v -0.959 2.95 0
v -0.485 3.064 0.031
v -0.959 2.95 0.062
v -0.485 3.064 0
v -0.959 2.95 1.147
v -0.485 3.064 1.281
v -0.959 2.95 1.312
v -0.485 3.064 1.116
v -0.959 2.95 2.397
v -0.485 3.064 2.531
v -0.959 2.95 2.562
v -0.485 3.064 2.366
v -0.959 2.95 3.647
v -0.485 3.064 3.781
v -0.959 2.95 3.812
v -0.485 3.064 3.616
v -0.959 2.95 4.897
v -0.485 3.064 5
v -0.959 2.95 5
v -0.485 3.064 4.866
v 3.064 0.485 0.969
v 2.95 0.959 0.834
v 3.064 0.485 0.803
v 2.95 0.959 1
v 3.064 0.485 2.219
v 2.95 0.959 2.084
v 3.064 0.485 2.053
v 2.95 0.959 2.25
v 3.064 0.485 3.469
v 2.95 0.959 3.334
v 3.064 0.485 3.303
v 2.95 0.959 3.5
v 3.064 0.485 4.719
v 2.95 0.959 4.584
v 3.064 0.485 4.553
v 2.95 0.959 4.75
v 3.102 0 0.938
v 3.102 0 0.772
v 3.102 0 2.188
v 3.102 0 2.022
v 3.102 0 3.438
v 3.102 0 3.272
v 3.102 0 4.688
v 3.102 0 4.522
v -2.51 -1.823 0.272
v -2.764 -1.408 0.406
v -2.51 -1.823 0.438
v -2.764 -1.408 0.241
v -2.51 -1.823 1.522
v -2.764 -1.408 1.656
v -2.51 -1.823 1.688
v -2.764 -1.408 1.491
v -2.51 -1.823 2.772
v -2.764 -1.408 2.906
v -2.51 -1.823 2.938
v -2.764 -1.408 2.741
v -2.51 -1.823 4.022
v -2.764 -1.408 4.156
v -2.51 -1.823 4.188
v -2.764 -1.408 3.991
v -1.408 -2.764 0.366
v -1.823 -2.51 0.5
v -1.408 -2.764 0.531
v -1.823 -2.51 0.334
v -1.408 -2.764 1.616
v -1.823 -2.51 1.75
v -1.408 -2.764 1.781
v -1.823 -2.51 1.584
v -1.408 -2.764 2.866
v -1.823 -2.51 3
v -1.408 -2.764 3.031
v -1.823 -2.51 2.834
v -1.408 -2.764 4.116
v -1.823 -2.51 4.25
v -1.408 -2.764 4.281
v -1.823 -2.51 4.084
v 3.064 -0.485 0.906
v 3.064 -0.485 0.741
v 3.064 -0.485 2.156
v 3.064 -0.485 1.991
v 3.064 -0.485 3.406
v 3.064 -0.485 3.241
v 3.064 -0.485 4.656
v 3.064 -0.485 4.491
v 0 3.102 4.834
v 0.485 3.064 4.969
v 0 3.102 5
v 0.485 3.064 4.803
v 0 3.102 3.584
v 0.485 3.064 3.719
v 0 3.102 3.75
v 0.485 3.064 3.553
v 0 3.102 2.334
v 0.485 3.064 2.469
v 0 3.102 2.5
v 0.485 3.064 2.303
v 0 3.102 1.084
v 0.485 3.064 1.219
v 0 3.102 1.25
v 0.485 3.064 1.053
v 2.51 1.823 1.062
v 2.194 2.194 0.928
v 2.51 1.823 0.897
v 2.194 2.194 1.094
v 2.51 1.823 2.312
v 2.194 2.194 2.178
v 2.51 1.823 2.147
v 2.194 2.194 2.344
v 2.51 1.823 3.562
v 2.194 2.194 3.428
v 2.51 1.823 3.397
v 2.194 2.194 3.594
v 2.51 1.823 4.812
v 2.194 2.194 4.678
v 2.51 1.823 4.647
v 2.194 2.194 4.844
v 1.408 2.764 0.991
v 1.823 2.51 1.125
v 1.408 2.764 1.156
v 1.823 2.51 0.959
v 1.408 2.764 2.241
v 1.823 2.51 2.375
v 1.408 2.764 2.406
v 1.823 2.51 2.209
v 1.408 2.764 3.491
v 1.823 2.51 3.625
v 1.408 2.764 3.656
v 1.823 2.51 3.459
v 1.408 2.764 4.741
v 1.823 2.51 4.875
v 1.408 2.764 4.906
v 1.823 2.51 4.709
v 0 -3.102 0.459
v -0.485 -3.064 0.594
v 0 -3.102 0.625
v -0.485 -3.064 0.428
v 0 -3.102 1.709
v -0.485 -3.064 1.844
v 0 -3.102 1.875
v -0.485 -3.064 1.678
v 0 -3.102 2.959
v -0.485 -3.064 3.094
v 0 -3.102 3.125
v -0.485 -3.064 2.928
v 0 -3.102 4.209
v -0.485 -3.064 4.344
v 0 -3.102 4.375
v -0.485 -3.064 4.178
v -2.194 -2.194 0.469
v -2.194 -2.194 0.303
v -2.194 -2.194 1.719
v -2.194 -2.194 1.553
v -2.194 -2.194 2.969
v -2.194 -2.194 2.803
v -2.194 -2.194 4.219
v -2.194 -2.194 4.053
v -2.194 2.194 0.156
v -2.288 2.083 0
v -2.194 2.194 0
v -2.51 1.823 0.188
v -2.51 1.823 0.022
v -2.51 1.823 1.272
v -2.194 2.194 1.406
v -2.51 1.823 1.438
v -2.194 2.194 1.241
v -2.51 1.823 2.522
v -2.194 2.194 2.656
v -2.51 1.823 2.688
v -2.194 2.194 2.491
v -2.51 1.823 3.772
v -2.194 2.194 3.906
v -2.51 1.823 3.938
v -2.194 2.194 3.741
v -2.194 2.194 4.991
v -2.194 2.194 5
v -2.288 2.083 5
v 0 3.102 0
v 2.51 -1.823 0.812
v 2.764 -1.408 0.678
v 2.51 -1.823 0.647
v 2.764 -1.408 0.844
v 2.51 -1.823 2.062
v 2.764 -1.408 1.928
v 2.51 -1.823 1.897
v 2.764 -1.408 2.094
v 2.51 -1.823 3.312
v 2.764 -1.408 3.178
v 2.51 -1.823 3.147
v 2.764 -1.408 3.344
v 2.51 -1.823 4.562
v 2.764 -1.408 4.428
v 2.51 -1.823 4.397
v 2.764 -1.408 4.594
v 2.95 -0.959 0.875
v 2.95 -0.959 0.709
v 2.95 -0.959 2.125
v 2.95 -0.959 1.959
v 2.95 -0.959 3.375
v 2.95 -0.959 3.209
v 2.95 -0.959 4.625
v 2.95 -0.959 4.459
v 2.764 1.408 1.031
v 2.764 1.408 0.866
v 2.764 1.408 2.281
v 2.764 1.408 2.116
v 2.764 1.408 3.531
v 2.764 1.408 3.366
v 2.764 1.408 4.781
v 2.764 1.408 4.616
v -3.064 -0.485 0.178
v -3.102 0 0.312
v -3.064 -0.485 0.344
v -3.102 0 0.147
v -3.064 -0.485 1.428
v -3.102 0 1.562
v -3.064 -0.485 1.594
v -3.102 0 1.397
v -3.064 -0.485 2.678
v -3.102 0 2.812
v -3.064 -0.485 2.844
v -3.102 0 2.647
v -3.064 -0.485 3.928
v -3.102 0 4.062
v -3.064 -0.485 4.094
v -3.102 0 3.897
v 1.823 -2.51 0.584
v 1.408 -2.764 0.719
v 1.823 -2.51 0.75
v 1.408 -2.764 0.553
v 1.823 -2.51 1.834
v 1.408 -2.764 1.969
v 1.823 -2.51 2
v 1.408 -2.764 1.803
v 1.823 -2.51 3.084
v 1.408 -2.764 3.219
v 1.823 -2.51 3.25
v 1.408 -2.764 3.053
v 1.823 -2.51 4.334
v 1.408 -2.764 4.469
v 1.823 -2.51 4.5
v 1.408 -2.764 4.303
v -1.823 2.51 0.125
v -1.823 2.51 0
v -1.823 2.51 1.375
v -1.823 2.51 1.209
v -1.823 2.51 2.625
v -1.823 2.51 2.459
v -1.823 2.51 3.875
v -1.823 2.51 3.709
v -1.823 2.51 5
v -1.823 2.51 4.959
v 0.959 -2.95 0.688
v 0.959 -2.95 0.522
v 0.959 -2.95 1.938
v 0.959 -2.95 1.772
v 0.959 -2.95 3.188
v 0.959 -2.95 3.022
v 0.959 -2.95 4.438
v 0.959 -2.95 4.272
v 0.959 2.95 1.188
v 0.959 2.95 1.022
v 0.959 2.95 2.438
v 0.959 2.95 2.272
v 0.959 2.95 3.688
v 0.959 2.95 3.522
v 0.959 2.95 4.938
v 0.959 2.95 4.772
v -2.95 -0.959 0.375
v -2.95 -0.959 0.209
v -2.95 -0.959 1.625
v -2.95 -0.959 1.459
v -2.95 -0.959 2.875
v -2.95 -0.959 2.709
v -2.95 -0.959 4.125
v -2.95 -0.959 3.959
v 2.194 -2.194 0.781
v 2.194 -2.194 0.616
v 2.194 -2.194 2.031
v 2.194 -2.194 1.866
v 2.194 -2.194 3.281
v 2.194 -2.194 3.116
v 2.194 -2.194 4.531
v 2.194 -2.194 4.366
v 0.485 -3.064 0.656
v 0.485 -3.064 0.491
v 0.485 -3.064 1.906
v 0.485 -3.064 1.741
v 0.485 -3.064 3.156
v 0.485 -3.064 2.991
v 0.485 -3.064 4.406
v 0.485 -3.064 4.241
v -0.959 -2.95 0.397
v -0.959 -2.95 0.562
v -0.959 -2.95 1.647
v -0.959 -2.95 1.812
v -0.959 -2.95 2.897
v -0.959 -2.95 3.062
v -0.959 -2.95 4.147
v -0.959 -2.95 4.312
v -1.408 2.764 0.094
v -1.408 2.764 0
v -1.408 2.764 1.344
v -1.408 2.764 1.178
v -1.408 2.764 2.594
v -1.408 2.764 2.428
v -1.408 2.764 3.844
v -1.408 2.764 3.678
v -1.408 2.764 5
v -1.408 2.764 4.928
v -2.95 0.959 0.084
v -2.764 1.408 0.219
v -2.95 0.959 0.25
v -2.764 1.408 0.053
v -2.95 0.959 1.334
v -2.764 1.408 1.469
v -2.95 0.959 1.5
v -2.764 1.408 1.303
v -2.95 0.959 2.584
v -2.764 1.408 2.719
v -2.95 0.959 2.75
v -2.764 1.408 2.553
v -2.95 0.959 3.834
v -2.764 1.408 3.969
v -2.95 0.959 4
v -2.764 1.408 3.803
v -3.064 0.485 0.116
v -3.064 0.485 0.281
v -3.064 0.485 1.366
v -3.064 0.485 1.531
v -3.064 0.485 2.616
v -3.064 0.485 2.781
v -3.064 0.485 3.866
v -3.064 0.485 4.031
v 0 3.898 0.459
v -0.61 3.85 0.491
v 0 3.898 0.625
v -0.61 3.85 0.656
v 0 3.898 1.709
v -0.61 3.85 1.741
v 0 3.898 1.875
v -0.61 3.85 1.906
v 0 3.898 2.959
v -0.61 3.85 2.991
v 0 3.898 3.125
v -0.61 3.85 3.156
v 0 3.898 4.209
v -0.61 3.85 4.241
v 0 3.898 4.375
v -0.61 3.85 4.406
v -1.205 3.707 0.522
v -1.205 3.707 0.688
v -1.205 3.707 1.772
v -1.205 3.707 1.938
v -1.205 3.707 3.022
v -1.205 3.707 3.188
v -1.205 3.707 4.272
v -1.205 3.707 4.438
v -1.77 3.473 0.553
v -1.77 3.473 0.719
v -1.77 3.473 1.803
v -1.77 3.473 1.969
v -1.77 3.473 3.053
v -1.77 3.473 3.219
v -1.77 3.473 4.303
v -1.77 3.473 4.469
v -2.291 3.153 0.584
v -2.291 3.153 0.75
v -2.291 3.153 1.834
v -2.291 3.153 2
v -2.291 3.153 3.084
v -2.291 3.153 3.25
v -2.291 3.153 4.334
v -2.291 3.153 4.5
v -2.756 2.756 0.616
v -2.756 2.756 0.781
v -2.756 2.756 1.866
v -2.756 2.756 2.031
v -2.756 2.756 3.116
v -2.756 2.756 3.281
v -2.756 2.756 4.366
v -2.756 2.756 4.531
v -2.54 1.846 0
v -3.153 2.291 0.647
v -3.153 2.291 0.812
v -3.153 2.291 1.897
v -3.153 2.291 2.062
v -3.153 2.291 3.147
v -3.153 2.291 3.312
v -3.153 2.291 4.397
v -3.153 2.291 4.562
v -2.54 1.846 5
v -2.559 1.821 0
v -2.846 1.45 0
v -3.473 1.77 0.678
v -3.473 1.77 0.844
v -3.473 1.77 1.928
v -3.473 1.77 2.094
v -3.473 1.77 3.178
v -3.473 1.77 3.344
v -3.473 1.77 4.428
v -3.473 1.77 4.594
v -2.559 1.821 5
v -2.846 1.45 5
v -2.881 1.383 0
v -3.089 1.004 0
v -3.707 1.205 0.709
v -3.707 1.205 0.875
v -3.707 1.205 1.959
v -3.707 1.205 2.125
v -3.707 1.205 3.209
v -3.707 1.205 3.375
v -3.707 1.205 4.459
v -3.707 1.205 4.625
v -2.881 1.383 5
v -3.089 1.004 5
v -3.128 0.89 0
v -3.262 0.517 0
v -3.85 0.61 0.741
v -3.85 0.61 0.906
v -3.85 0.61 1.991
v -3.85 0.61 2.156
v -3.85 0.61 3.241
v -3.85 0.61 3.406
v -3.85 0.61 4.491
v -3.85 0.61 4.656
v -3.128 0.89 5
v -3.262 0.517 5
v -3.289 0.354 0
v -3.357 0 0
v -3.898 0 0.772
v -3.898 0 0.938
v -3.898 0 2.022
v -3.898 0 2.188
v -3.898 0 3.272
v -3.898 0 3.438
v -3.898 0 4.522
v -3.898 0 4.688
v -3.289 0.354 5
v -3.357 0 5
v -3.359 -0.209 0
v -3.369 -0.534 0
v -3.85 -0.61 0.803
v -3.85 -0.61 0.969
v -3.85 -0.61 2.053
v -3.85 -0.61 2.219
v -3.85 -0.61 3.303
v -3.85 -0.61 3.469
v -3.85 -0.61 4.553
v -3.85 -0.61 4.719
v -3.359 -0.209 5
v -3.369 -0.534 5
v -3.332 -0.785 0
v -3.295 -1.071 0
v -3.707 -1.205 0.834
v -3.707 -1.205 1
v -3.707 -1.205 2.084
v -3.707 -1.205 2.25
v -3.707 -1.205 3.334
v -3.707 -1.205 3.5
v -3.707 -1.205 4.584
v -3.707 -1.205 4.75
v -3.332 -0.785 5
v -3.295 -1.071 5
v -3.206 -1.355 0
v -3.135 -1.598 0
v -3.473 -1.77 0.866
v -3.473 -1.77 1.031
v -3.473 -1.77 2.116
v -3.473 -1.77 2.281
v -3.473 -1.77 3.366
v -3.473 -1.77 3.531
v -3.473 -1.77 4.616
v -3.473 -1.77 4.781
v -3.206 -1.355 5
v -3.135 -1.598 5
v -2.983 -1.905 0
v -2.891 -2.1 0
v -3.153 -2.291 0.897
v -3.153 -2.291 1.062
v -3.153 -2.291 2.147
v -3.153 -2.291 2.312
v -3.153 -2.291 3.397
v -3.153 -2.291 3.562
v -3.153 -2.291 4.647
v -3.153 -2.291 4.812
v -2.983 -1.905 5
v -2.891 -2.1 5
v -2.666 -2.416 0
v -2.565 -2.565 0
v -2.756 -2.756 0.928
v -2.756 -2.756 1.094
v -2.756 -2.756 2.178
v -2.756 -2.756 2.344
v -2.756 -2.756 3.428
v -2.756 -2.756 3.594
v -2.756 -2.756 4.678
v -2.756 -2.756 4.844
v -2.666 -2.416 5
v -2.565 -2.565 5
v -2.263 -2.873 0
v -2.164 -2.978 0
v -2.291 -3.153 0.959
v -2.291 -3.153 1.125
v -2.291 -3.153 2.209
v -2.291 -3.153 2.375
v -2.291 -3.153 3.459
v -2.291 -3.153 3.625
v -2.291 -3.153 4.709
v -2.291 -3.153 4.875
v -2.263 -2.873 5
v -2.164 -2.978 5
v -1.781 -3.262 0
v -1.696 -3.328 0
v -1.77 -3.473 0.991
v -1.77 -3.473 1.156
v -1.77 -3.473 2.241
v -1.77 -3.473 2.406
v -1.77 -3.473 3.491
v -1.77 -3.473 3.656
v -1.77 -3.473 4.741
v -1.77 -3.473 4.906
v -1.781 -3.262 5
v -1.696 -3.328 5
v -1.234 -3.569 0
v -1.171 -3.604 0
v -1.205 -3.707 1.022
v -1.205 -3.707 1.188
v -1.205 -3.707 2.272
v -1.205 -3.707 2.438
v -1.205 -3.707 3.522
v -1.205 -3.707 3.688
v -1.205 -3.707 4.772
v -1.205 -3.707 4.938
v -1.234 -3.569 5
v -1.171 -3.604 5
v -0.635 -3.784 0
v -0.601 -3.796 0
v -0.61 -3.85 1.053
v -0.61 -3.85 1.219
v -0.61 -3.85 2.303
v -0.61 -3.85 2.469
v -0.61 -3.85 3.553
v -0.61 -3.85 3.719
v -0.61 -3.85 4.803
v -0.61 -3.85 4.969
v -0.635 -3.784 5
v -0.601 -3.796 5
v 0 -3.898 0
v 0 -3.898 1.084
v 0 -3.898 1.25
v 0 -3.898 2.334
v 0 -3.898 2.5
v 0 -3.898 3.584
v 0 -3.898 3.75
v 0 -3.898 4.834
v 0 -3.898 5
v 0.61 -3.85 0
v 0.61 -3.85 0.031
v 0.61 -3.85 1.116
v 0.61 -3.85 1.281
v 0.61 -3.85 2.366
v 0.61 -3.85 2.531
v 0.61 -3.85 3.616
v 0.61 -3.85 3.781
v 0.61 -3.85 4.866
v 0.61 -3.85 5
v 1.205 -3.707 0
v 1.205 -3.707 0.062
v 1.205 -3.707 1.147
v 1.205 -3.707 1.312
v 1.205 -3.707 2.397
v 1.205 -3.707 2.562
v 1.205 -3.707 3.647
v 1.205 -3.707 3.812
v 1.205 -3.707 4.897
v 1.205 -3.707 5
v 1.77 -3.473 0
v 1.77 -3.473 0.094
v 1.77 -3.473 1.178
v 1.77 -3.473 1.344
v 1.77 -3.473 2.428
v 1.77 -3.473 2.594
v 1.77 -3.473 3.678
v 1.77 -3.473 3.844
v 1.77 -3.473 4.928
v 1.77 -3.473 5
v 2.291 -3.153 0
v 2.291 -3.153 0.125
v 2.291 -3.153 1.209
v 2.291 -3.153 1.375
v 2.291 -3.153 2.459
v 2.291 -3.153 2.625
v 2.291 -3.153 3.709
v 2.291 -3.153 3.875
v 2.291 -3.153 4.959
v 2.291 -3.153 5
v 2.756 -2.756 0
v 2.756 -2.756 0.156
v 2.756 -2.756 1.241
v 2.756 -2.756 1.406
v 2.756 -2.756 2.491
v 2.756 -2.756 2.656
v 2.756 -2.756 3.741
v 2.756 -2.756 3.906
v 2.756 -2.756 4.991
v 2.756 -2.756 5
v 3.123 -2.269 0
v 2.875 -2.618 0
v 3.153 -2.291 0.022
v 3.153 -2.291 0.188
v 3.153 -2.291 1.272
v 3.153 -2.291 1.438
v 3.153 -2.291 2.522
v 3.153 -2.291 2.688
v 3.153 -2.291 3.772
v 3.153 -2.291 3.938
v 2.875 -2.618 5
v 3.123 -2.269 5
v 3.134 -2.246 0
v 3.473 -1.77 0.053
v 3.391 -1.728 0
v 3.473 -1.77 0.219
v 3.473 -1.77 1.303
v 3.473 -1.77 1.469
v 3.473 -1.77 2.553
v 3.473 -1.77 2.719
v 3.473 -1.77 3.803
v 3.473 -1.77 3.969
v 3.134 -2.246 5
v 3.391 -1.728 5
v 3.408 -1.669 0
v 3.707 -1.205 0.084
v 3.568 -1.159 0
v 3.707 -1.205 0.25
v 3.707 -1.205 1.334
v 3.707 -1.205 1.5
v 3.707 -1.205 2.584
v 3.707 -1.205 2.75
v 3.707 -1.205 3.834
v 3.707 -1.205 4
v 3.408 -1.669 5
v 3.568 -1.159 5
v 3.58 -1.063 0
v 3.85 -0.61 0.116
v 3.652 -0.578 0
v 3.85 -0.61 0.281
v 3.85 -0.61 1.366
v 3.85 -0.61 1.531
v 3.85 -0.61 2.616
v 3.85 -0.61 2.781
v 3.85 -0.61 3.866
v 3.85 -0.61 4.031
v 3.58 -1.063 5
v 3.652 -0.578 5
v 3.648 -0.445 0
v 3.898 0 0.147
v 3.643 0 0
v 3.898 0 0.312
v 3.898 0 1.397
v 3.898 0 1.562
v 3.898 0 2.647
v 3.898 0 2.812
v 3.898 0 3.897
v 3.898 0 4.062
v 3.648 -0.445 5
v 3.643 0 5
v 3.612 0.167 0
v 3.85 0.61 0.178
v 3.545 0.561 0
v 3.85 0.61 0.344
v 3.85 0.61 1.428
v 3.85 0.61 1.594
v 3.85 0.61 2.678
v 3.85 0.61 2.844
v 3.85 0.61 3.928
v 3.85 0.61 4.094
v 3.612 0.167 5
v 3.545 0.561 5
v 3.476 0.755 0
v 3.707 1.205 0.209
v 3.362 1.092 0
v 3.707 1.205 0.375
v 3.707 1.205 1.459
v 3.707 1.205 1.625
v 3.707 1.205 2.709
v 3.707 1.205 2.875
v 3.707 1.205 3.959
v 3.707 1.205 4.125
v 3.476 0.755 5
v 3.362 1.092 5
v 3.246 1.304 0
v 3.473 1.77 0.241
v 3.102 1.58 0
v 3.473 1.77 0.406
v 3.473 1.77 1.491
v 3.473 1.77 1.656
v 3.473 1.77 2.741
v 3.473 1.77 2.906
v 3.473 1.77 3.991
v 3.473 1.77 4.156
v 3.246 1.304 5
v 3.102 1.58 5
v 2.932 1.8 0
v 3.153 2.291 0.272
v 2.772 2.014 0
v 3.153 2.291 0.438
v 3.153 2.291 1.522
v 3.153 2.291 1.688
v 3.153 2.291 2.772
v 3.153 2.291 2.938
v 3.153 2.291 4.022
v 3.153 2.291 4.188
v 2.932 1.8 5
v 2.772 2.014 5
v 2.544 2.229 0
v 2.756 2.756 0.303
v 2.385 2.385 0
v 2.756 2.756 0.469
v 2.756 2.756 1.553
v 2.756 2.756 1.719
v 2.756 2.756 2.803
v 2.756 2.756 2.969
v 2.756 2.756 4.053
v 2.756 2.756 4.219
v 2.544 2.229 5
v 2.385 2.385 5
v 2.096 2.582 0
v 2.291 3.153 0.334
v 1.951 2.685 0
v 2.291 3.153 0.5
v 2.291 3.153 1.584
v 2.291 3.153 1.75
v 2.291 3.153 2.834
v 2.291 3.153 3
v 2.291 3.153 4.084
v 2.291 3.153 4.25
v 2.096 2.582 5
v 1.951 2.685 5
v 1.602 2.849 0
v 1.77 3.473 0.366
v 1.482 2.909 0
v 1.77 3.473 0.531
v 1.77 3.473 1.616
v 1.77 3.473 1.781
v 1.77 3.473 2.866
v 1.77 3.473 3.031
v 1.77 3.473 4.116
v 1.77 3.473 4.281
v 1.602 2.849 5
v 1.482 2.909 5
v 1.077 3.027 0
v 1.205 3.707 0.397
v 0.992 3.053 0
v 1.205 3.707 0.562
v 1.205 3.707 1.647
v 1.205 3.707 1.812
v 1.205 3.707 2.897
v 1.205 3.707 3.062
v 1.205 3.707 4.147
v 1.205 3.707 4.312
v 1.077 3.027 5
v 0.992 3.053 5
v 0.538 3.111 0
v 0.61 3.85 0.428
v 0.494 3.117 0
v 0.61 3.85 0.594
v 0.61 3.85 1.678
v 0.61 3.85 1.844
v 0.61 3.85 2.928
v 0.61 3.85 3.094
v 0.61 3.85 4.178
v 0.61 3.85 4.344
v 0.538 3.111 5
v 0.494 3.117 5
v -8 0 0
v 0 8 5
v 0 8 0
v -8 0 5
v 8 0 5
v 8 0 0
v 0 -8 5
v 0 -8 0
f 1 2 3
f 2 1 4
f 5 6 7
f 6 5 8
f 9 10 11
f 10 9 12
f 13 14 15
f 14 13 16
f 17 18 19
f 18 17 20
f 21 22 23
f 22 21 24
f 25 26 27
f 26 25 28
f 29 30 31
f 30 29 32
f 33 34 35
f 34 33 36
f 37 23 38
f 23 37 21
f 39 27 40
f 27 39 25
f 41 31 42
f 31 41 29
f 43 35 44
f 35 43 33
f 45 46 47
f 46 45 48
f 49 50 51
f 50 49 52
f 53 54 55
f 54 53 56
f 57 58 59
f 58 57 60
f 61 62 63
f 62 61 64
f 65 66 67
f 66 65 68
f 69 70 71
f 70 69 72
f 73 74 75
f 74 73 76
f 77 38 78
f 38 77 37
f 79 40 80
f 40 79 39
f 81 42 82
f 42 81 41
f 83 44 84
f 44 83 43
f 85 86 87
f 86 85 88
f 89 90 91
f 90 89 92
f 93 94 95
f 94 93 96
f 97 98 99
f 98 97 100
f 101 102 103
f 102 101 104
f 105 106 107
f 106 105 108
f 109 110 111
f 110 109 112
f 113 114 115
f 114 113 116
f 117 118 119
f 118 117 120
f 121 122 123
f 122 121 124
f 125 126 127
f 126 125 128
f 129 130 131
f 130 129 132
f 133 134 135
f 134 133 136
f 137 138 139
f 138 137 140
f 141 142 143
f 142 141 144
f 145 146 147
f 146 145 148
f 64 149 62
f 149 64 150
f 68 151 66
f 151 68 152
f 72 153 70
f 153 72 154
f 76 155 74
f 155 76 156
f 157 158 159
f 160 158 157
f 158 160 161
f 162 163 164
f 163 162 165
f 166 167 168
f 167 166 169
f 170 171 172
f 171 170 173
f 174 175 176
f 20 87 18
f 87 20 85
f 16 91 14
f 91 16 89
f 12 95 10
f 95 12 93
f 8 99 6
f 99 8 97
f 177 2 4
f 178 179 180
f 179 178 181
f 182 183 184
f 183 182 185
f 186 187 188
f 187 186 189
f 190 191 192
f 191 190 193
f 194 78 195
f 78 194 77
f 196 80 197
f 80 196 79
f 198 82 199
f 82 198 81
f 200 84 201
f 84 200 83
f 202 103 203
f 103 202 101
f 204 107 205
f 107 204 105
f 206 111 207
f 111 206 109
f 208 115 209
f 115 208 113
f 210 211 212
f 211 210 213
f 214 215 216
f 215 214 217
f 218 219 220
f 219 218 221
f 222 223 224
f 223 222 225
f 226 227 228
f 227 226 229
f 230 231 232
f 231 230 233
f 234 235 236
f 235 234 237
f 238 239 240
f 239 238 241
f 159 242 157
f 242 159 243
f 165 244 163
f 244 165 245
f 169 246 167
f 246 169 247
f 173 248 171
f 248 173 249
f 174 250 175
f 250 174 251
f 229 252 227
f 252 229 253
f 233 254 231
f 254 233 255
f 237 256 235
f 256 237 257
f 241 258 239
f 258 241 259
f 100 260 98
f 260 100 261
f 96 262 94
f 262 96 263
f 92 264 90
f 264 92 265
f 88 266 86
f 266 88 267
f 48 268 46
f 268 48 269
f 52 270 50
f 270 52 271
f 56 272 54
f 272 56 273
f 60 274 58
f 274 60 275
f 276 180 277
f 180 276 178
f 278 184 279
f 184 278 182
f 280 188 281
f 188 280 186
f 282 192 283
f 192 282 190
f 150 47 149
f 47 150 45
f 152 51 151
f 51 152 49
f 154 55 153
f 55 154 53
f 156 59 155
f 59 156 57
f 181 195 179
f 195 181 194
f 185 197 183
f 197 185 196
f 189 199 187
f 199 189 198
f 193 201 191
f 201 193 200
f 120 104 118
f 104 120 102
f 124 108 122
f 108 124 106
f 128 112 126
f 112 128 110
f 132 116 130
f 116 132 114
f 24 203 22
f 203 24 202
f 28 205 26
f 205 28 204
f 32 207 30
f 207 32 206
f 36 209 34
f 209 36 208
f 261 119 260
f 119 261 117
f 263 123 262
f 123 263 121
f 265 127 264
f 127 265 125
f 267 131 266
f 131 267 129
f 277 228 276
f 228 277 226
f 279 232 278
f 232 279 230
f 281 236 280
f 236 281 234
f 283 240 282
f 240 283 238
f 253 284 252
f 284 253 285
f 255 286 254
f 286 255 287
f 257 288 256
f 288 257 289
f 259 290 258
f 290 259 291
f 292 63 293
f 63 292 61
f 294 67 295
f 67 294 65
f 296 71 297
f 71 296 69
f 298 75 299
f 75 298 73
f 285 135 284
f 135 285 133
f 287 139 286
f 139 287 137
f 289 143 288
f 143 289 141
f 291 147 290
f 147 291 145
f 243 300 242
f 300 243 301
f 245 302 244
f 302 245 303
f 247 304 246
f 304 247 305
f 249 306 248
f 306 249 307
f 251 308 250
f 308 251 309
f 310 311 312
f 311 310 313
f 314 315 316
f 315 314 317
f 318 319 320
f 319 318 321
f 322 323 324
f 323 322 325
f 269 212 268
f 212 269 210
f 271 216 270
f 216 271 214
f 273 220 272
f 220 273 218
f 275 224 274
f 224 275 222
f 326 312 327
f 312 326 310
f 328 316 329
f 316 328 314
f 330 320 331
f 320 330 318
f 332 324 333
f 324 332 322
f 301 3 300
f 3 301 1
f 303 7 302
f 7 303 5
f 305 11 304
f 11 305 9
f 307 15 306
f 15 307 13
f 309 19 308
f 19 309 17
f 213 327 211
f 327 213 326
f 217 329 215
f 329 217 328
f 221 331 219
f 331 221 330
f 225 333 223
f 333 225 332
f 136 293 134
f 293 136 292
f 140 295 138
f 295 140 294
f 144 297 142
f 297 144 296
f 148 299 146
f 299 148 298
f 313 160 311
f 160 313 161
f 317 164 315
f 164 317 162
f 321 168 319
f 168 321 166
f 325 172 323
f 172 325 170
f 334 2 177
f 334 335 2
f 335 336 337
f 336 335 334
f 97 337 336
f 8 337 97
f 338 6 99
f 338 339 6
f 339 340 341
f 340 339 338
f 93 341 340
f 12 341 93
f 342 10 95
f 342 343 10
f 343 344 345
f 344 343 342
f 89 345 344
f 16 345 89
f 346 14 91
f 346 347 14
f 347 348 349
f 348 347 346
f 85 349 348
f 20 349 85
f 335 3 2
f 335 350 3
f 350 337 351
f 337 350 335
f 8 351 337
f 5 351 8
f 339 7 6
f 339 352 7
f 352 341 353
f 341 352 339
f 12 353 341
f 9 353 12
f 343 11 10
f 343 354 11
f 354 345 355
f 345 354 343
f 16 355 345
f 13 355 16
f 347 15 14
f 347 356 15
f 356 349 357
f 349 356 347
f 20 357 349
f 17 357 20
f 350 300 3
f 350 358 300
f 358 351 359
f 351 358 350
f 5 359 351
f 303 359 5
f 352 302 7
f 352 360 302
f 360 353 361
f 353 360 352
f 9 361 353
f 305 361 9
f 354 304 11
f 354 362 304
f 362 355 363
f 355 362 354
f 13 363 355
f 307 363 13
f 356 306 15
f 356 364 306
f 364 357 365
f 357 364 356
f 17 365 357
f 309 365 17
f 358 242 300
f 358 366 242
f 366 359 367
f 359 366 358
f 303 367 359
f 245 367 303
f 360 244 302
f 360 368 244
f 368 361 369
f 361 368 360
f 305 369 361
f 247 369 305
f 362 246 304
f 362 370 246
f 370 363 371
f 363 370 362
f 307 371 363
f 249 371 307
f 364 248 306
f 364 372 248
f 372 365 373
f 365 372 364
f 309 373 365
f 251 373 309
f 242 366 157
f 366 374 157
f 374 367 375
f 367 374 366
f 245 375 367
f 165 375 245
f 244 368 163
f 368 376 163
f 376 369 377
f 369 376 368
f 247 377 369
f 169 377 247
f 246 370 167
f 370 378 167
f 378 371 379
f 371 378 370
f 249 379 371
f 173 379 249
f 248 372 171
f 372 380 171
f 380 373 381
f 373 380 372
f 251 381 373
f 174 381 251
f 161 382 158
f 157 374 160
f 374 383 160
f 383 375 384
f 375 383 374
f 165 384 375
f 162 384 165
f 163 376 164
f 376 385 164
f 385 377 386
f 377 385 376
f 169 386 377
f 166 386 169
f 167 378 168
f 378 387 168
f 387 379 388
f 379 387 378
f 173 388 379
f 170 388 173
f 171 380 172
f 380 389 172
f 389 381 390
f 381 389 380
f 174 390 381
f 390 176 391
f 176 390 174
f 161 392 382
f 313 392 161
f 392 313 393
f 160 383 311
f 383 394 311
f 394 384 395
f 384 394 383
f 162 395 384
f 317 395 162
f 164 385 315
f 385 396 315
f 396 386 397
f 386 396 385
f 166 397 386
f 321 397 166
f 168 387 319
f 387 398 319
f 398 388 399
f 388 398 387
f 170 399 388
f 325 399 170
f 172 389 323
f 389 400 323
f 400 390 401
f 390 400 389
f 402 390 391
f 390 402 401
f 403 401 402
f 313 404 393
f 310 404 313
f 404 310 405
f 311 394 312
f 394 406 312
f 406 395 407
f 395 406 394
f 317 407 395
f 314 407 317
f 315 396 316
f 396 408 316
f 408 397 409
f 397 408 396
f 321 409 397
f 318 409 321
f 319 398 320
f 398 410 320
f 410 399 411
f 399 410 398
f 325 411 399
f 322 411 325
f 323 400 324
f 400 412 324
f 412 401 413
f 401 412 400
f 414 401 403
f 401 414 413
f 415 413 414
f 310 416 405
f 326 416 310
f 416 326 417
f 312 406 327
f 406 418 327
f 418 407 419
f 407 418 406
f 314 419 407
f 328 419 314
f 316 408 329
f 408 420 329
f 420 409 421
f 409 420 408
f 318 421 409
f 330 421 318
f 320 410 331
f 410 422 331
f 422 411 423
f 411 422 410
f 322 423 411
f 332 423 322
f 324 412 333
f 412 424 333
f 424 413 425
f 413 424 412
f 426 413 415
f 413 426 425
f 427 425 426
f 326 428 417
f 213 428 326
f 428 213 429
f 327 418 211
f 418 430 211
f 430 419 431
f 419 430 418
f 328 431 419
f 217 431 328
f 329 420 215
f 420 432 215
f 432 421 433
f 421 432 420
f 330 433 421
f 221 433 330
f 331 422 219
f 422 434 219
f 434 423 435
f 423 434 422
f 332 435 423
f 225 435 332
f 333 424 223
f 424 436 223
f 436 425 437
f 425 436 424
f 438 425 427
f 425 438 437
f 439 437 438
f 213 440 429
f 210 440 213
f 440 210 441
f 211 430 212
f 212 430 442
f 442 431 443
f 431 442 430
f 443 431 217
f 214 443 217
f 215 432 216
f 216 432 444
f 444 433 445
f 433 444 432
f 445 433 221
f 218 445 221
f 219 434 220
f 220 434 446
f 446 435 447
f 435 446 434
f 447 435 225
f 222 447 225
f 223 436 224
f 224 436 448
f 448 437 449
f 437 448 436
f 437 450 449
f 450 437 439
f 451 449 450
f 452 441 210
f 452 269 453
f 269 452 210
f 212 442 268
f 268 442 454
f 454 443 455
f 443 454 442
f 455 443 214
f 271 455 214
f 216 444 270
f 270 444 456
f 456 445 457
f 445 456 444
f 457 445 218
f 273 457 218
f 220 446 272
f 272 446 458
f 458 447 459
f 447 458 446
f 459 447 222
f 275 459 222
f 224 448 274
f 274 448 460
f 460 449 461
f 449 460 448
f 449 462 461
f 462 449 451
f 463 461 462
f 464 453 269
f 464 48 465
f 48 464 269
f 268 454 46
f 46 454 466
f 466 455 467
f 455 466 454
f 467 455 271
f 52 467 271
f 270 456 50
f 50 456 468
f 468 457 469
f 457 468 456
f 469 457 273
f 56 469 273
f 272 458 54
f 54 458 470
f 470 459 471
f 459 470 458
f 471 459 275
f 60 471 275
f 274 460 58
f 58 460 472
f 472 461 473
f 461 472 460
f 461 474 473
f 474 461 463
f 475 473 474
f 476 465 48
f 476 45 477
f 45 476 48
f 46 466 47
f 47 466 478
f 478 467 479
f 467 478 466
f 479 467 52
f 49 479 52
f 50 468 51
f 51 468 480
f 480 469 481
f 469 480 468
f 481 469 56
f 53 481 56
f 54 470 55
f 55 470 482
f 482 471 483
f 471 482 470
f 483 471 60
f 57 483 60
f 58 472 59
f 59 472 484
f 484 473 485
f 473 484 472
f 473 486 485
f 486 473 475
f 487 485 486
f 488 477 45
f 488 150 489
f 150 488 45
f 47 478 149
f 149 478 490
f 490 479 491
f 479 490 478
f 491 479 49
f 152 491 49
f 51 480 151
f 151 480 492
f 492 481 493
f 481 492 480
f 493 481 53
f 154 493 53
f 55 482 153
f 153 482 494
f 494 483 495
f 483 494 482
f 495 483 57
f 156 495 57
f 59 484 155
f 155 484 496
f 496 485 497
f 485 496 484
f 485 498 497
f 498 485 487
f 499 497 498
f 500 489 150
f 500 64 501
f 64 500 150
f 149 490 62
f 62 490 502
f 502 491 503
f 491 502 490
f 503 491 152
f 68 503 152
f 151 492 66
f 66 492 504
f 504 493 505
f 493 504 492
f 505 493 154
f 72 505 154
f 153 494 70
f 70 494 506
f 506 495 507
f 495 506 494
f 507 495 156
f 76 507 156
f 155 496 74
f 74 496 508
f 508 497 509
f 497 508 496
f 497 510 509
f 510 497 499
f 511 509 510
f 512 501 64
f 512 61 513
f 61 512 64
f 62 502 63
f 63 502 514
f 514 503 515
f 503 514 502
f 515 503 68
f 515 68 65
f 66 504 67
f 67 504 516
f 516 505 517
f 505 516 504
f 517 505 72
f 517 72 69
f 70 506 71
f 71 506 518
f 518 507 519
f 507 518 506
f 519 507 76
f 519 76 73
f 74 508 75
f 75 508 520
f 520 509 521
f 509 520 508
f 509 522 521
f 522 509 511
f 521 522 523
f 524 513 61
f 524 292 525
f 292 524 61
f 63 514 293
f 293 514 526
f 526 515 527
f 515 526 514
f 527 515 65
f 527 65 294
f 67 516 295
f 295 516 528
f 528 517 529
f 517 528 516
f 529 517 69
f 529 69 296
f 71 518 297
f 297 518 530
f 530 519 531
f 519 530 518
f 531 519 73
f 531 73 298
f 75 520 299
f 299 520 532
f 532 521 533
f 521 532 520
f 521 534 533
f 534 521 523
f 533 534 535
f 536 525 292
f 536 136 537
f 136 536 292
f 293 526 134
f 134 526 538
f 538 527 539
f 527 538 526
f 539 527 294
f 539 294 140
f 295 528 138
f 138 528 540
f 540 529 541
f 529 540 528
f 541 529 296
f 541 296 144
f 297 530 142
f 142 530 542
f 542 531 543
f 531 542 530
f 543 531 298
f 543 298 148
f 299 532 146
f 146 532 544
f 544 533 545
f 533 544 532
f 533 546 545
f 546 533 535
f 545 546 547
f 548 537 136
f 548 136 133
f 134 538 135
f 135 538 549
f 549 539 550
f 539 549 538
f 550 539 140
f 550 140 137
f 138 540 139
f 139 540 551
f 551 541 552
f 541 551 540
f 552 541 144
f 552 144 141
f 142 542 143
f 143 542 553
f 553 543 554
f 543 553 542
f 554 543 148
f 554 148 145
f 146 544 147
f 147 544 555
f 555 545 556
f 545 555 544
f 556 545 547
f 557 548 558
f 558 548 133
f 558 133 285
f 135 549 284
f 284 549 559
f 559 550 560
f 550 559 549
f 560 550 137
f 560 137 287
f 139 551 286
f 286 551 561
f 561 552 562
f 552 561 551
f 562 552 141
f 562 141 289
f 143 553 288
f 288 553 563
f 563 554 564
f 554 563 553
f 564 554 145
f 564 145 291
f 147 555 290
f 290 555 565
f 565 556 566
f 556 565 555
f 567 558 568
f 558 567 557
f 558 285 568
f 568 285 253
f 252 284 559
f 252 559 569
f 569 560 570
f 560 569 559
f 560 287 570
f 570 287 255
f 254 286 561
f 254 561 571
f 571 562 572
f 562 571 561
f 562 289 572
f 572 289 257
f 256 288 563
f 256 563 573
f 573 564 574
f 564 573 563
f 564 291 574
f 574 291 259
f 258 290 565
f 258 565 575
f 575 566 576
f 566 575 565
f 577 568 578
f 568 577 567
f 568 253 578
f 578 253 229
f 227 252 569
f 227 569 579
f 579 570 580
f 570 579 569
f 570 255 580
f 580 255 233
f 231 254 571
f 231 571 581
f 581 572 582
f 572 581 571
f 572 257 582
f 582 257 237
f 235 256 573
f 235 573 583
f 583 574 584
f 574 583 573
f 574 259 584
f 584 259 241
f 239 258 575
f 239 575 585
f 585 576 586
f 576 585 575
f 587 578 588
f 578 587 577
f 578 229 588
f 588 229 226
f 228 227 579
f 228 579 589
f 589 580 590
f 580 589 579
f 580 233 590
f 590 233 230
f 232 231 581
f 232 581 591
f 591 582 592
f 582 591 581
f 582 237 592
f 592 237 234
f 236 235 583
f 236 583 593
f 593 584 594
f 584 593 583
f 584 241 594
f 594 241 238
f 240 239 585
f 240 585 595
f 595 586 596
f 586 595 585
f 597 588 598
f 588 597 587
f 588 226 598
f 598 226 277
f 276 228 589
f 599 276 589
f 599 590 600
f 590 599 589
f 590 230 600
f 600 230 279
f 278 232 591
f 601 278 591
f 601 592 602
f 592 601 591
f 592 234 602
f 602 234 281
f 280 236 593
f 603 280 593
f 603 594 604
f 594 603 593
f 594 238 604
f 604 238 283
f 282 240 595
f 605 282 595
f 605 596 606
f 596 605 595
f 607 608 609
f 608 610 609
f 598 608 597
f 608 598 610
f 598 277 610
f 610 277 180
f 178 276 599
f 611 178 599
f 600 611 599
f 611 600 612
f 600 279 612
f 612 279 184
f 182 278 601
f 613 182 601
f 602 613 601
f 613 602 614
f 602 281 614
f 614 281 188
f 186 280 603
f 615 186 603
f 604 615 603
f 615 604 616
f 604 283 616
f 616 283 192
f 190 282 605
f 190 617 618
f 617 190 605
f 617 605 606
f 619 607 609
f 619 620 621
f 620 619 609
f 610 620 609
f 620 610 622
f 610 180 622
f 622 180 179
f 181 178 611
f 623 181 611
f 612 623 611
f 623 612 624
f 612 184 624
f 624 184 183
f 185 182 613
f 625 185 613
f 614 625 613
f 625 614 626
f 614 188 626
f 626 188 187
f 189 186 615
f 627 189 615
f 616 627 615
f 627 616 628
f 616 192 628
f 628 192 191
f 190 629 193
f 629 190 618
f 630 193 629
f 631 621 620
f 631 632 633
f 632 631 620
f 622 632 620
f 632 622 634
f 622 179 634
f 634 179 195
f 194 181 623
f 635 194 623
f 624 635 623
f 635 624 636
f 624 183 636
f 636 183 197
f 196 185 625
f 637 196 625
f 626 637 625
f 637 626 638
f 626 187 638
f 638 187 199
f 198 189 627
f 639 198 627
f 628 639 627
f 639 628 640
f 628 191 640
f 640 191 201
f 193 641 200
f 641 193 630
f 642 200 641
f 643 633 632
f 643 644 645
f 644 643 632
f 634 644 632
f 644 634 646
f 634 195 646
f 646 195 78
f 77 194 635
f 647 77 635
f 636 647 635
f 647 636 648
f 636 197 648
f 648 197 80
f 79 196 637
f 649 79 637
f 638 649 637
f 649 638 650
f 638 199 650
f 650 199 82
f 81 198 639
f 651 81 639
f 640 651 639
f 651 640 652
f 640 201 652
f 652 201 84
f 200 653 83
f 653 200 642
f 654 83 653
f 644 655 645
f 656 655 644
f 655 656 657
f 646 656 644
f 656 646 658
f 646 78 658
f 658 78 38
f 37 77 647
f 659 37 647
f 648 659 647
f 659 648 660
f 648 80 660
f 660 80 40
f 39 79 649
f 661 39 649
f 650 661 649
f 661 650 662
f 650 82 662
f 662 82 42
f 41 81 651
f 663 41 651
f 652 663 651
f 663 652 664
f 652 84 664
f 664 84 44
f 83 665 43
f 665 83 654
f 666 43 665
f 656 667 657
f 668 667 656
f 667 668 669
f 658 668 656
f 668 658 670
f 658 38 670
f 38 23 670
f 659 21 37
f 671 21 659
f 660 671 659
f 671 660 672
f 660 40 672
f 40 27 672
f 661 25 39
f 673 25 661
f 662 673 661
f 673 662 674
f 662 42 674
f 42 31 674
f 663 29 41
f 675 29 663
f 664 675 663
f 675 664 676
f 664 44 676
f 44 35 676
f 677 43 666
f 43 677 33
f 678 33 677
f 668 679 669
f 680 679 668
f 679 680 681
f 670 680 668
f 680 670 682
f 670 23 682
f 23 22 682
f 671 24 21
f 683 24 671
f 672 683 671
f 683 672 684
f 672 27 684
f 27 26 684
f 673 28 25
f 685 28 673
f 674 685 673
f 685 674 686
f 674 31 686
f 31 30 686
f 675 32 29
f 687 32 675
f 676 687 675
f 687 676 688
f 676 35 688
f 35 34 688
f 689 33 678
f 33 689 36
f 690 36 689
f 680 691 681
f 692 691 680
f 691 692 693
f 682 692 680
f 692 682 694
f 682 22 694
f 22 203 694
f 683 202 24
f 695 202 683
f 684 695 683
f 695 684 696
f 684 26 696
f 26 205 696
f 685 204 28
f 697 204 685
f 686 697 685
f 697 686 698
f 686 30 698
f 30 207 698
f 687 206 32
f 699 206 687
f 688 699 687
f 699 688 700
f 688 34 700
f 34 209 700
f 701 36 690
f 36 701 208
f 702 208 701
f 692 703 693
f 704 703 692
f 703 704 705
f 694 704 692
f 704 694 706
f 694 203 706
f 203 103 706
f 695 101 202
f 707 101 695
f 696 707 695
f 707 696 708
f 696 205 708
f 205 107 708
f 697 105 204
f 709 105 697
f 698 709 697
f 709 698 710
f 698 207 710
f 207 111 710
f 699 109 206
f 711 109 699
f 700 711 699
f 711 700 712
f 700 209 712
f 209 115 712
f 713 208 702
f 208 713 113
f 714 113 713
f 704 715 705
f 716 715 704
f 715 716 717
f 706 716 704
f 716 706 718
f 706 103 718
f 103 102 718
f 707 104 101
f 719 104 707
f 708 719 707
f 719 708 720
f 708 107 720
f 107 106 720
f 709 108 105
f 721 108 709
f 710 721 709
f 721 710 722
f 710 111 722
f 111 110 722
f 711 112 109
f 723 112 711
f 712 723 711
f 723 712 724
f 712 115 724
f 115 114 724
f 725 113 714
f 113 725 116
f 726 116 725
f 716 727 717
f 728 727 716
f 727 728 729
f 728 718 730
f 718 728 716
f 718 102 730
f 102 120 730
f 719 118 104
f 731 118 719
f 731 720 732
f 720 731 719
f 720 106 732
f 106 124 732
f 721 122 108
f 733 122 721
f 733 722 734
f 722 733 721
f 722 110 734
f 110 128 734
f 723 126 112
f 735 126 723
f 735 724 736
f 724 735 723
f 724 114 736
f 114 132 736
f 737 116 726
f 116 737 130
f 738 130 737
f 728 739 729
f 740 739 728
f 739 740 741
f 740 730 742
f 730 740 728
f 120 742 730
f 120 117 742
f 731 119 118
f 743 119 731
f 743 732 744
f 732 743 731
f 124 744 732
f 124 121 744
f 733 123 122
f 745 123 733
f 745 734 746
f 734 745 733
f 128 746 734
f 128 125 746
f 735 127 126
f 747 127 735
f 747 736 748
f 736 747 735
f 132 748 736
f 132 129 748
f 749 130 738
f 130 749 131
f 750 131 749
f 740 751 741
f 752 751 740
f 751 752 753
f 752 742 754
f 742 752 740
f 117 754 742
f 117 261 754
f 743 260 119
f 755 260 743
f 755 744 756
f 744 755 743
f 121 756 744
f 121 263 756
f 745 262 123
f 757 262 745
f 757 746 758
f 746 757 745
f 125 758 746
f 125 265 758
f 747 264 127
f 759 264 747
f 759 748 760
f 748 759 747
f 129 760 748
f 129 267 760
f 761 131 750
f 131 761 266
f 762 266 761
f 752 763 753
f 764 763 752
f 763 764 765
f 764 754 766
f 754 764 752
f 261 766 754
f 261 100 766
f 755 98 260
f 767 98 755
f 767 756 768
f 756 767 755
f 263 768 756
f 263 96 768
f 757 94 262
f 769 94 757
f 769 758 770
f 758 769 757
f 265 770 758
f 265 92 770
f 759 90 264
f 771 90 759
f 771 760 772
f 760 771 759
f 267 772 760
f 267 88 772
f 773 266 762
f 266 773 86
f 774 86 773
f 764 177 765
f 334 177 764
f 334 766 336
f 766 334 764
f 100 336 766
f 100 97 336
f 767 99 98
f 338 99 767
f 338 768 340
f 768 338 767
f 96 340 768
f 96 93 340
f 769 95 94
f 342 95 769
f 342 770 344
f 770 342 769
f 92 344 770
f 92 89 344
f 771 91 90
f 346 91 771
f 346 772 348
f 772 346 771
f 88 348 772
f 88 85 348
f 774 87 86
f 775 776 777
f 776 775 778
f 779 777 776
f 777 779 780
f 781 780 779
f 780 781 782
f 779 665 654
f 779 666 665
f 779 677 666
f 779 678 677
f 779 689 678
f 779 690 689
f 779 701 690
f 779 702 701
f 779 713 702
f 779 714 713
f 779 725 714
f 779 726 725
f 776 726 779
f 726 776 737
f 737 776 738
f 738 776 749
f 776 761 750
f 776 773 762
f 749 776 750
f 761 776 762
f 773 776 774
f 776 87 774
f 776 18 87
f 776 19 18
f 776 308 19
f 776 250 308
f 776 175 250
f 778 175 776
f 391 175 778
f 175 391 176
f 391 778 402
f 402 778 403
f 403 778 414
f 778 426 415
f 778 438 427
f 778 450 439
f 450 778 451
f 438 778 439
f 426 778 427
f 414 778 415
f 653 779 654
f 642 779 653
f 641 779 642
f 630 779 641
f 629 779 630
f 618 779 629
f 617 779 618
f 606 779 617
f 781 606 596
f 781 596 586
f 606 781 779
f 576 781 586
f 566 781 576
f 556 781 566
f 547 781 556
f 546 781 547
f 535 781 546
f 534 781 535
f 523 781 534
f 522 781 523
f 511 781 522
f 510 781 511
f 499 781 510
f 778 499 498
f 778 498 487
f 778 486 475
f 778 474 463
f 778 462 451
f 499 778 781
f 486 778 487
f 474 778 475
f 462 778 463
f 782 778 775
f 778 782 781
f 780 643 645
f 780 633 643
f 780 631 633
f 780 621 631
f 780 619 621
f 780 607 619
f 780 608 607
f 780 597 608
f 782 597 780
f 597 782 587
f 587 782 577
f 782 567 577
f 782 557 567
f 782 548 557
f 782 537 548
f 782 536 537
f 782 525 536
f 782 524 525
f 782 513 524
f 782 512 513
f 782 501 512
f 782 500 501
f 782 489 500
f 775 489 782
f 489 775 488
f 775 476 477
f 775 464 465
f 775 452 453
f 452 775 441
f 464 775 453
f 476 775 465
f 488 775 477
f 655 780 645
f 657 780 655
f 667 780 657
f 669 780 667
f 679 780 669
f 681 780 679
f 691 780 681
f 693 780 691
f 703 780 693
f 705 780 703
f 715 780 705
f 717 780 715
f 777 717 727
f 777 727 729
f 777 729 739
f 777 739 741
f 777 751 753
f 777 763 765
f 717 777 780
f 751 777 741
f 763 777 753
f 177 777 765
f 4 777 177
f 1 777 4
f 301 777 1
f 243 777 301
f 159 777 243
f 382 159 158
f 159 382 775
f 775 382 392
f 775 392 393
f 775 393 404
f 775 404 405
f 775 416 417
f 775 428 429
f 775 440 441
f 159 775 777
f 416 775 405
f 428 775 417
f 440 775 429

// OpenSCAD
// file: naca4.scad
// Naca4.scad - library for parametric airfoils of 4 digit NACA series
// Code: Rudolf Huttary, Berlin
// June 2015
// commercial use prohibited


// general use: for more examples refer to sampler.scad
// naca = naca digits or 3el vector  (default = 12 or [0, 0, .12])
// L    = chord length [mm]      (default= 100)
// N    = # sample points        (default= 81)
// h    = height [mm]            (default= 1)
// open = close at the thin end? (default = true)
// two equivalent example calls
 airfoil(naca = 2408, L = 60, N=1001, h = 30, open = false);
// airfoil(naca = [.2, .4, .32], L = 60, N=1001, h = 30, open = false);

module help()
{
  echo(str("\n\nList of signatures in lib:\n=================\n",
  "module airfoil(naca=2412, L = 100, N = 81, h = 1, open = false) - renders airfoil object\n",
  "module airfoil(naca=[.2, .4, .12], L = 100, N = 81, h = 1, open = false) - renders airfoil object using percentage for camber,  camber distance and thicknes\n",
  "function airfoil_data(naca=12, L = 100, N = 81, open = false)\n",
  "=================\n"));
}

help();
// this is the object
module airfoil(naca=12, L = 100, N = 81, h = 1, open = false)
{
  linear_extrude(height = h)
  polygon(points = airfoil_data(naca, L, N, open));
}

// this is the main function providing the airfoil data
function airfoil_data(naca=12, L = 100, N = 81, open = false) =
  let(Na = len(naca)!=3?NACA(naca):naca)
  let(A = [.2969, -0.126, -.3516, .2843, open?-0.1015:-0.1036])
  [for (b=[-180:360/(N):179.99])
    let (x = (1-cos(b))/2)
    let(yt = sign(b)*Na[2]/.2*(A*[sqrt(x), x, x*x, x*x*x, x*x*x*x]))
    Na[0]==0?L*[x, yt]:L*camber(x, yt, Na[0], Na[1], sign(b))];

// helper functions
function NACA(naca) =
  let (M = floor(naca/1000))
  let (P = floor((naca-M*1000)/100))
  [M/100, P/10, floor(naca-M*1000-P*100)/100];

function camber(x, y, M, P, upper) =
  let(yc = (x<P)?M/P/P*(2*P*x-x*x): M/(1-P)/(1-P)*(1 - 2*P + 2*P*x -x*x))
  let(dy = (x<P)?2*M/P/P*(P-x):2*M/(1-P)/(1-P)*(P-x))
  let(th = atan(dy))
  [upper ? x - y*sin(th):x + y*sin(th), upper ? yc + y*cos(th):yc - y*cos(th)];
// file: Naca_sweep.scad
// Naca4_sweep.scad - sweep library
// Code: Rudolf Huttary, Berlin
// June 2015
// commercial use prohibited

use <naca4.scad>

//example1();
//rotate([80, 180, 130])
example();

// sweep from NACA1480 to NACA6480 (len = 230 mm, winding y,z = 80°
// sweeps generates a single polyhedron from multiple datasets
module example()
{
  N = 40;
  sweep(gen_dat(N=5, dz=1,N=N));

  // specific generator function
  function gen_dat(M=10,dz=.1,N=10) = [for (i=[1:dz:M])
    let( L = length(i))
    let( af = vec3D(
        airfoil_data([.1,.5,thickness(i)], L=length(i), N = N)))
    T_(-L/2, 0, (i+1)*2, af)];  // translate airfoil

  function thickness(i) = .5*sin(i*i)+.1;
  function length(i) = (60+sin(12*(i-3))*30);
}

module help()
{
  echo(str("\n\nList of signatures in lib:\n=================\n",
  "sweep(dat, convexity = 5, showslices = false, plaincaps = true)  // dat - vec of vec2, with vec1 = airfoil_data\n",
  "function vec3D(v, z=0)  // expand vec2 to vec3",
  "function rot(w=0, p) // rotate vec2",
  "function T_(x=0, y=0, z=0, v) // translates vec of vec3\n",
  "function R_(x=0, y=0, z=0, v) // rotates vec of vec3\n",
  "function Rx_(x=0, v) // x-rotates vec of vec3\n",
  "function Ry_(y=0, v) // y-rotates vec of vec3\n",
  "function Rz_(z=0, v) // z-rotates vec of vec3\n",
  "function T_(x=0, y=0, z=0, v) // translates vec of vec3\n",
  "function Tx_(x=0, v) // x-translates vec of vec3\n",
  "function Ry_(y=0, v) // y-translates vec of vec3\n",
  "function Rz_(z=0, v) // z-translates vec of vec3\n",
  "function S_(x=0, y=0, z=0, v) // scales vec of vec3\n",
  "function Sx_(x=0, v) // x-translates vec of vec3\n",
  "function Sy_(x=0, v) // y-translates vec of vec3\n",
  "function Sz_(x=0, v) // z-translates vec of vec3\n",
  "=================\n"));
}


// generate polyhedron from multiple airfoil_datasets
// dat - vec of vec1, with vec1 = simple polygon like airfoil_data, > 3 points per dataset expected
module sweep(dat, convexity = 5, showslices = false, plaincaps = true)
{
  n = len(dat);     // # datasets
  l = len(dat[0]);  // points per dataset
  if(l<=3)
    echo("ERROR: sweep() expects more than 3 points per dataset");
  else
  {
    if(n==1)
      polyhedron(points = dat[0], faces = [count(l-1, 0)]);
    else{
    first = plaincaps?[count(l-1, 0)]:
            faces_polygon(l, true);  // triangulate first dataset
    last = plaincaps?[count((n-1)*l,(n)*l-1)]:
            faces_shift((n-2)*l, faces_polygon(l, false)); // triangulate last dataset
    if (showslices)
      for(i=[0:n-1])
        sweep([dat[i]]);
    else
      if (n<2)  // this case is also used recursively for showslices
        polyhedron(points = flat(), faces  = last, convexity = 5);
      else
      {
        polyhedron(points = flat(),
                   faces  = concat(first, last, faces_sweep(l,n)), convexity = 5);
      }
    }
  }
  function count(a, b) = let(st = (a<b?1:-1))[for (i=[a:st:b]) i];
  function faces_shift(d, dat) = [for (i=[0:len(dat)-1]) dat[i] + [d, d, d]];
  function flat() = [for (i=[0:n-1], j=[0:l-1]) dat[i][j]];
}

function del(A, n) = [for(i=[0:len(A)-1]) if (n!=i)A[i]];

//// composition stuff for polyhedron
  function faces_sweep(l, n=1) = let(M = n*l)
      concat([[0,l,l-1]],   // first face
      [for (i=[0:l*(n-1)-2], j = [0,1])
        j==0? [i, i+1, (i+l)] : [i+1, (i+l+1), i+l]],
      [[n*l-1, (n-1)*l-1, (n-1)*l]]) // last face
      ;

  function faces_polygon(l, first = true) = let(odd = (l%2==1), d=first?0:l)
    let(res = odd?concat([[d,d+1,d+l-1]],
      [for (i=[1:(l-3)/2], j=[0,1])(j==0)?[d+i,d+i+1,d+l-i]:[d+i+1,d+l-i-1, d+l-i]]):
      [for (i=[0:(l-4)/2], j=[0,1])(j==0)?[d+i,d+i+1,d+l-i-1]:[d+i+1,d+l-i-2, d+l-i-1]])
    first?facerev(res):res;

  function facerev(dat) = [for (i=[0:len(dat)-1]) [dat[i][0],dat[i][2],dat[i][1]]];



//// vector and vector set operation stuff ///////////////////////
//// Expand 2D vector into 3D
function vec3D(v, z=0) = [for(i = [0:len(v)-1])
  len(v[i])==2?[v[i][0], v[i][1], z]:v[i]+[0, 0, z]];

// Translation - 1D, 2D, 3D point vector //////////////////////////
// vector along all axes
function T_(x=0, y=0, z=0, v) = let(x_ = (len(x)==3)?x:[x, y, z])
  [for (i=[0:len(v)-1]) T__(x_[0], x_[1], x_[2], p=v[i])];
/// vector along one axis
function Tx_(x=0, v) = T_(x=x, v=v);
function Ty_(y=0, v) = T_(y=y, v=v);
function Tz_(z=0, v) = T_(z=z, v=v);
/// point along all axes 1D, 2D, 3D allowed
function T__(x=0, y=0, z=0, p) = len(p)==3?p+[x, y, z]:len(p)==2?p+[x, y]:p+x;

//// Rotation - 2D, 3D point vector ///////////////////////////////////
// vector around all axes
function R_(x=0, y=0, z=0, v) =             // 2D vectors allowed
  let(x_ = (len(x)==3)?x:[x, y, z])
  len(v[0])==3?Rx_(x_[0], Ry_(x_[1], Rz_(x_[2], v))):
  [for(i = [0:len(v)-1]) rot(x_[2], v[i])];
// vector around one axis
function Rx_(w, A) = A*[[1, 0, 0], [0, cos(w), sin(w)], [0, -sin(w), cos(w)]];
function Ry_(w, A) = A*[[cos(w), 0, sin(w)], [0, 1, 0], [-sin(w), 0, cos(w)]];
function Rz_(w, A) = A*[[cos(w), sin(w), 0], [-sin(w), cos(w), 0], [0, 0, 1]];


//// Scale - 2D, 3D point vector ///////////////////////////////////
// vector along all axes
function S_(x=1, y=1, z=1, v) =
  [for (i=[0:len(v)-1]) S__(x,y,z, v[i])];
// vector along one axis
function Sx_(x=0, v) = S_(x=x, v=v);
function Sy_(y=0, v) = S_(y=y, v=v);
function Sz_(z=0, v) = S_(z=z, v=v);
// single point in 2D
function S__(x=1, y=1, z=1, p) =
  len(p)==3?[p[0]*x, p[1]*y, p[2]*z]:len(p)==2?[p[0]*x+p[1]*y]:[p[0]*x];
// main file
// Threading.scad - library for threadings
// Autor: Rudolf Huttary, Berlin 2016

use <Naca_sweep.scad> // http://www.thingiverse.com/thing:900137

// examples
showexample = 10;   // choose your example number

example(showexample)
{
// #1 ACME thread
  threading(pitch = 2, d=20, windings = 5, angle = 29);

// #2 threaded rod 20°
  threading(pitch = 2, d=20, windings = 30, angle = 20, full = true);

// #3 nut for threaded rod 20°
  Threading(pitch = 2, d=20, windings = 10, angle = 20, full = true);

// #4 nut for threaded rod 20°, own diameter 25 mm, hires
  Threading(D = 25, pitch = 2, d=20, windings = 10, angle = 20, full = true, step = 50, $fn=100);

// #5 triple helix threaded rod
  threading(pitch = 2, d=20, windings = 30, helices = 3, angle = 20, full = true);

// #6 toothed rod (no pitch)
   threading(helices = 0, angle = 20, full = true);

// #7 toothed cube (no pitch)
   threading(helices = 0, angle = 60, full = true, steps=4);

// #8 M8 hex bolt
   union(){
     threading(pitch = 1.25, d=8, windings=20, full=true); cylinder(d=14.6, h=4, $fn=6);}
// #9 M8 hex nut
   Threading(D=14.6, pitch = 1.25, d=8, windings=5, full=true, $fn=6);
// #10 M8 four socket nut
   Threading(D=16, pitch = 1.25, d=8, windings=5, full=true, $fn=4);
}

module example(number=0) if(number) children(number-1);

help();
module help()
{
  helpstr =
  "Thread library - Rudolf Huttary \n
    D = {0=auto};  // Cyl diameter Threading() \n
    d = 6;         // outer diameter thread() \n
    windings = 10; // number of windings \n
    helices = 1;   // number of threads \n
    angle = 60;    // open angle <76, bolts: 60°, ACME: 29°, toothed Racks: 20° \n
    steps = 40;    // resolution \n
    help();        // show help in console
    threading(pitch = 1, d = 6, windings = 10, helices = 1, angle = 60, steps=40, full = false) \n
    Threading(D = 0, pitch = 1, r = 6, windings = 10, helices = 1, angle = 60, steps=40) \n
  ";
  echo (helpstr);
}

//Threading(R=12, pitch = pitch, r=radius, windings= windings, angle = angle);

module Threading(D = 0, pitch = 1, d = 12, windings = 10, helices = 1, angle = 60, steps=40)
{
  R = D==0?d/2+2*pitch/PI:D/2;
  translate([0,0,-pitch])
  difference()
  {
    translate([0,0,pitch])
    cylinder (r=R, h =pitch*(windings-helices));
    threading(pitch, d, windings, helices, angle, steps, true);
  }
}

module threading(pitch = 1, d = 12, windings = 10, helices = 1, angle = 60, steps=40, full = false)
{  // tricky: glue two 180° pieces together to get a proper manifold
  r = d/2;
  Steps = steps/2;
  Pitch = pitch*helices;
  if(full) cylinder(r = r-.5-pitch/PI, h=pitch*(windings+helices), $fn=steps);
  sweep(gen_dat());   // half screw
  rotate([0, 0, 180]) translate([0, 0, Pitch/2])
  sweep(gen_dat());   // half screw
echo(steps);
  function gen_dat() = let(ang = 180, bar = R_(180, -90, 0, Ty_(-r+.5, vec3D(pitch/PI*Rack(windings, angle)))))
        [for (i=[0:Steps]) Tz_(i/2/Steps*Pitch, Rz_(i*ang/Steps, bar))];

  function Rack(w, angle) =
     concat([[0, 2]], [for (i=[0:windings-1], j=[0:3])
     let(t = [ [0, 1], [2*tan(angle/2), -1], [PI/2, -1], [2*tan(angle/2)+PI/2, 1]])
        [t[j][0]+i*PI, t[j][1]]], [[w*PI, 1], [w*PI, 2]]);
}
